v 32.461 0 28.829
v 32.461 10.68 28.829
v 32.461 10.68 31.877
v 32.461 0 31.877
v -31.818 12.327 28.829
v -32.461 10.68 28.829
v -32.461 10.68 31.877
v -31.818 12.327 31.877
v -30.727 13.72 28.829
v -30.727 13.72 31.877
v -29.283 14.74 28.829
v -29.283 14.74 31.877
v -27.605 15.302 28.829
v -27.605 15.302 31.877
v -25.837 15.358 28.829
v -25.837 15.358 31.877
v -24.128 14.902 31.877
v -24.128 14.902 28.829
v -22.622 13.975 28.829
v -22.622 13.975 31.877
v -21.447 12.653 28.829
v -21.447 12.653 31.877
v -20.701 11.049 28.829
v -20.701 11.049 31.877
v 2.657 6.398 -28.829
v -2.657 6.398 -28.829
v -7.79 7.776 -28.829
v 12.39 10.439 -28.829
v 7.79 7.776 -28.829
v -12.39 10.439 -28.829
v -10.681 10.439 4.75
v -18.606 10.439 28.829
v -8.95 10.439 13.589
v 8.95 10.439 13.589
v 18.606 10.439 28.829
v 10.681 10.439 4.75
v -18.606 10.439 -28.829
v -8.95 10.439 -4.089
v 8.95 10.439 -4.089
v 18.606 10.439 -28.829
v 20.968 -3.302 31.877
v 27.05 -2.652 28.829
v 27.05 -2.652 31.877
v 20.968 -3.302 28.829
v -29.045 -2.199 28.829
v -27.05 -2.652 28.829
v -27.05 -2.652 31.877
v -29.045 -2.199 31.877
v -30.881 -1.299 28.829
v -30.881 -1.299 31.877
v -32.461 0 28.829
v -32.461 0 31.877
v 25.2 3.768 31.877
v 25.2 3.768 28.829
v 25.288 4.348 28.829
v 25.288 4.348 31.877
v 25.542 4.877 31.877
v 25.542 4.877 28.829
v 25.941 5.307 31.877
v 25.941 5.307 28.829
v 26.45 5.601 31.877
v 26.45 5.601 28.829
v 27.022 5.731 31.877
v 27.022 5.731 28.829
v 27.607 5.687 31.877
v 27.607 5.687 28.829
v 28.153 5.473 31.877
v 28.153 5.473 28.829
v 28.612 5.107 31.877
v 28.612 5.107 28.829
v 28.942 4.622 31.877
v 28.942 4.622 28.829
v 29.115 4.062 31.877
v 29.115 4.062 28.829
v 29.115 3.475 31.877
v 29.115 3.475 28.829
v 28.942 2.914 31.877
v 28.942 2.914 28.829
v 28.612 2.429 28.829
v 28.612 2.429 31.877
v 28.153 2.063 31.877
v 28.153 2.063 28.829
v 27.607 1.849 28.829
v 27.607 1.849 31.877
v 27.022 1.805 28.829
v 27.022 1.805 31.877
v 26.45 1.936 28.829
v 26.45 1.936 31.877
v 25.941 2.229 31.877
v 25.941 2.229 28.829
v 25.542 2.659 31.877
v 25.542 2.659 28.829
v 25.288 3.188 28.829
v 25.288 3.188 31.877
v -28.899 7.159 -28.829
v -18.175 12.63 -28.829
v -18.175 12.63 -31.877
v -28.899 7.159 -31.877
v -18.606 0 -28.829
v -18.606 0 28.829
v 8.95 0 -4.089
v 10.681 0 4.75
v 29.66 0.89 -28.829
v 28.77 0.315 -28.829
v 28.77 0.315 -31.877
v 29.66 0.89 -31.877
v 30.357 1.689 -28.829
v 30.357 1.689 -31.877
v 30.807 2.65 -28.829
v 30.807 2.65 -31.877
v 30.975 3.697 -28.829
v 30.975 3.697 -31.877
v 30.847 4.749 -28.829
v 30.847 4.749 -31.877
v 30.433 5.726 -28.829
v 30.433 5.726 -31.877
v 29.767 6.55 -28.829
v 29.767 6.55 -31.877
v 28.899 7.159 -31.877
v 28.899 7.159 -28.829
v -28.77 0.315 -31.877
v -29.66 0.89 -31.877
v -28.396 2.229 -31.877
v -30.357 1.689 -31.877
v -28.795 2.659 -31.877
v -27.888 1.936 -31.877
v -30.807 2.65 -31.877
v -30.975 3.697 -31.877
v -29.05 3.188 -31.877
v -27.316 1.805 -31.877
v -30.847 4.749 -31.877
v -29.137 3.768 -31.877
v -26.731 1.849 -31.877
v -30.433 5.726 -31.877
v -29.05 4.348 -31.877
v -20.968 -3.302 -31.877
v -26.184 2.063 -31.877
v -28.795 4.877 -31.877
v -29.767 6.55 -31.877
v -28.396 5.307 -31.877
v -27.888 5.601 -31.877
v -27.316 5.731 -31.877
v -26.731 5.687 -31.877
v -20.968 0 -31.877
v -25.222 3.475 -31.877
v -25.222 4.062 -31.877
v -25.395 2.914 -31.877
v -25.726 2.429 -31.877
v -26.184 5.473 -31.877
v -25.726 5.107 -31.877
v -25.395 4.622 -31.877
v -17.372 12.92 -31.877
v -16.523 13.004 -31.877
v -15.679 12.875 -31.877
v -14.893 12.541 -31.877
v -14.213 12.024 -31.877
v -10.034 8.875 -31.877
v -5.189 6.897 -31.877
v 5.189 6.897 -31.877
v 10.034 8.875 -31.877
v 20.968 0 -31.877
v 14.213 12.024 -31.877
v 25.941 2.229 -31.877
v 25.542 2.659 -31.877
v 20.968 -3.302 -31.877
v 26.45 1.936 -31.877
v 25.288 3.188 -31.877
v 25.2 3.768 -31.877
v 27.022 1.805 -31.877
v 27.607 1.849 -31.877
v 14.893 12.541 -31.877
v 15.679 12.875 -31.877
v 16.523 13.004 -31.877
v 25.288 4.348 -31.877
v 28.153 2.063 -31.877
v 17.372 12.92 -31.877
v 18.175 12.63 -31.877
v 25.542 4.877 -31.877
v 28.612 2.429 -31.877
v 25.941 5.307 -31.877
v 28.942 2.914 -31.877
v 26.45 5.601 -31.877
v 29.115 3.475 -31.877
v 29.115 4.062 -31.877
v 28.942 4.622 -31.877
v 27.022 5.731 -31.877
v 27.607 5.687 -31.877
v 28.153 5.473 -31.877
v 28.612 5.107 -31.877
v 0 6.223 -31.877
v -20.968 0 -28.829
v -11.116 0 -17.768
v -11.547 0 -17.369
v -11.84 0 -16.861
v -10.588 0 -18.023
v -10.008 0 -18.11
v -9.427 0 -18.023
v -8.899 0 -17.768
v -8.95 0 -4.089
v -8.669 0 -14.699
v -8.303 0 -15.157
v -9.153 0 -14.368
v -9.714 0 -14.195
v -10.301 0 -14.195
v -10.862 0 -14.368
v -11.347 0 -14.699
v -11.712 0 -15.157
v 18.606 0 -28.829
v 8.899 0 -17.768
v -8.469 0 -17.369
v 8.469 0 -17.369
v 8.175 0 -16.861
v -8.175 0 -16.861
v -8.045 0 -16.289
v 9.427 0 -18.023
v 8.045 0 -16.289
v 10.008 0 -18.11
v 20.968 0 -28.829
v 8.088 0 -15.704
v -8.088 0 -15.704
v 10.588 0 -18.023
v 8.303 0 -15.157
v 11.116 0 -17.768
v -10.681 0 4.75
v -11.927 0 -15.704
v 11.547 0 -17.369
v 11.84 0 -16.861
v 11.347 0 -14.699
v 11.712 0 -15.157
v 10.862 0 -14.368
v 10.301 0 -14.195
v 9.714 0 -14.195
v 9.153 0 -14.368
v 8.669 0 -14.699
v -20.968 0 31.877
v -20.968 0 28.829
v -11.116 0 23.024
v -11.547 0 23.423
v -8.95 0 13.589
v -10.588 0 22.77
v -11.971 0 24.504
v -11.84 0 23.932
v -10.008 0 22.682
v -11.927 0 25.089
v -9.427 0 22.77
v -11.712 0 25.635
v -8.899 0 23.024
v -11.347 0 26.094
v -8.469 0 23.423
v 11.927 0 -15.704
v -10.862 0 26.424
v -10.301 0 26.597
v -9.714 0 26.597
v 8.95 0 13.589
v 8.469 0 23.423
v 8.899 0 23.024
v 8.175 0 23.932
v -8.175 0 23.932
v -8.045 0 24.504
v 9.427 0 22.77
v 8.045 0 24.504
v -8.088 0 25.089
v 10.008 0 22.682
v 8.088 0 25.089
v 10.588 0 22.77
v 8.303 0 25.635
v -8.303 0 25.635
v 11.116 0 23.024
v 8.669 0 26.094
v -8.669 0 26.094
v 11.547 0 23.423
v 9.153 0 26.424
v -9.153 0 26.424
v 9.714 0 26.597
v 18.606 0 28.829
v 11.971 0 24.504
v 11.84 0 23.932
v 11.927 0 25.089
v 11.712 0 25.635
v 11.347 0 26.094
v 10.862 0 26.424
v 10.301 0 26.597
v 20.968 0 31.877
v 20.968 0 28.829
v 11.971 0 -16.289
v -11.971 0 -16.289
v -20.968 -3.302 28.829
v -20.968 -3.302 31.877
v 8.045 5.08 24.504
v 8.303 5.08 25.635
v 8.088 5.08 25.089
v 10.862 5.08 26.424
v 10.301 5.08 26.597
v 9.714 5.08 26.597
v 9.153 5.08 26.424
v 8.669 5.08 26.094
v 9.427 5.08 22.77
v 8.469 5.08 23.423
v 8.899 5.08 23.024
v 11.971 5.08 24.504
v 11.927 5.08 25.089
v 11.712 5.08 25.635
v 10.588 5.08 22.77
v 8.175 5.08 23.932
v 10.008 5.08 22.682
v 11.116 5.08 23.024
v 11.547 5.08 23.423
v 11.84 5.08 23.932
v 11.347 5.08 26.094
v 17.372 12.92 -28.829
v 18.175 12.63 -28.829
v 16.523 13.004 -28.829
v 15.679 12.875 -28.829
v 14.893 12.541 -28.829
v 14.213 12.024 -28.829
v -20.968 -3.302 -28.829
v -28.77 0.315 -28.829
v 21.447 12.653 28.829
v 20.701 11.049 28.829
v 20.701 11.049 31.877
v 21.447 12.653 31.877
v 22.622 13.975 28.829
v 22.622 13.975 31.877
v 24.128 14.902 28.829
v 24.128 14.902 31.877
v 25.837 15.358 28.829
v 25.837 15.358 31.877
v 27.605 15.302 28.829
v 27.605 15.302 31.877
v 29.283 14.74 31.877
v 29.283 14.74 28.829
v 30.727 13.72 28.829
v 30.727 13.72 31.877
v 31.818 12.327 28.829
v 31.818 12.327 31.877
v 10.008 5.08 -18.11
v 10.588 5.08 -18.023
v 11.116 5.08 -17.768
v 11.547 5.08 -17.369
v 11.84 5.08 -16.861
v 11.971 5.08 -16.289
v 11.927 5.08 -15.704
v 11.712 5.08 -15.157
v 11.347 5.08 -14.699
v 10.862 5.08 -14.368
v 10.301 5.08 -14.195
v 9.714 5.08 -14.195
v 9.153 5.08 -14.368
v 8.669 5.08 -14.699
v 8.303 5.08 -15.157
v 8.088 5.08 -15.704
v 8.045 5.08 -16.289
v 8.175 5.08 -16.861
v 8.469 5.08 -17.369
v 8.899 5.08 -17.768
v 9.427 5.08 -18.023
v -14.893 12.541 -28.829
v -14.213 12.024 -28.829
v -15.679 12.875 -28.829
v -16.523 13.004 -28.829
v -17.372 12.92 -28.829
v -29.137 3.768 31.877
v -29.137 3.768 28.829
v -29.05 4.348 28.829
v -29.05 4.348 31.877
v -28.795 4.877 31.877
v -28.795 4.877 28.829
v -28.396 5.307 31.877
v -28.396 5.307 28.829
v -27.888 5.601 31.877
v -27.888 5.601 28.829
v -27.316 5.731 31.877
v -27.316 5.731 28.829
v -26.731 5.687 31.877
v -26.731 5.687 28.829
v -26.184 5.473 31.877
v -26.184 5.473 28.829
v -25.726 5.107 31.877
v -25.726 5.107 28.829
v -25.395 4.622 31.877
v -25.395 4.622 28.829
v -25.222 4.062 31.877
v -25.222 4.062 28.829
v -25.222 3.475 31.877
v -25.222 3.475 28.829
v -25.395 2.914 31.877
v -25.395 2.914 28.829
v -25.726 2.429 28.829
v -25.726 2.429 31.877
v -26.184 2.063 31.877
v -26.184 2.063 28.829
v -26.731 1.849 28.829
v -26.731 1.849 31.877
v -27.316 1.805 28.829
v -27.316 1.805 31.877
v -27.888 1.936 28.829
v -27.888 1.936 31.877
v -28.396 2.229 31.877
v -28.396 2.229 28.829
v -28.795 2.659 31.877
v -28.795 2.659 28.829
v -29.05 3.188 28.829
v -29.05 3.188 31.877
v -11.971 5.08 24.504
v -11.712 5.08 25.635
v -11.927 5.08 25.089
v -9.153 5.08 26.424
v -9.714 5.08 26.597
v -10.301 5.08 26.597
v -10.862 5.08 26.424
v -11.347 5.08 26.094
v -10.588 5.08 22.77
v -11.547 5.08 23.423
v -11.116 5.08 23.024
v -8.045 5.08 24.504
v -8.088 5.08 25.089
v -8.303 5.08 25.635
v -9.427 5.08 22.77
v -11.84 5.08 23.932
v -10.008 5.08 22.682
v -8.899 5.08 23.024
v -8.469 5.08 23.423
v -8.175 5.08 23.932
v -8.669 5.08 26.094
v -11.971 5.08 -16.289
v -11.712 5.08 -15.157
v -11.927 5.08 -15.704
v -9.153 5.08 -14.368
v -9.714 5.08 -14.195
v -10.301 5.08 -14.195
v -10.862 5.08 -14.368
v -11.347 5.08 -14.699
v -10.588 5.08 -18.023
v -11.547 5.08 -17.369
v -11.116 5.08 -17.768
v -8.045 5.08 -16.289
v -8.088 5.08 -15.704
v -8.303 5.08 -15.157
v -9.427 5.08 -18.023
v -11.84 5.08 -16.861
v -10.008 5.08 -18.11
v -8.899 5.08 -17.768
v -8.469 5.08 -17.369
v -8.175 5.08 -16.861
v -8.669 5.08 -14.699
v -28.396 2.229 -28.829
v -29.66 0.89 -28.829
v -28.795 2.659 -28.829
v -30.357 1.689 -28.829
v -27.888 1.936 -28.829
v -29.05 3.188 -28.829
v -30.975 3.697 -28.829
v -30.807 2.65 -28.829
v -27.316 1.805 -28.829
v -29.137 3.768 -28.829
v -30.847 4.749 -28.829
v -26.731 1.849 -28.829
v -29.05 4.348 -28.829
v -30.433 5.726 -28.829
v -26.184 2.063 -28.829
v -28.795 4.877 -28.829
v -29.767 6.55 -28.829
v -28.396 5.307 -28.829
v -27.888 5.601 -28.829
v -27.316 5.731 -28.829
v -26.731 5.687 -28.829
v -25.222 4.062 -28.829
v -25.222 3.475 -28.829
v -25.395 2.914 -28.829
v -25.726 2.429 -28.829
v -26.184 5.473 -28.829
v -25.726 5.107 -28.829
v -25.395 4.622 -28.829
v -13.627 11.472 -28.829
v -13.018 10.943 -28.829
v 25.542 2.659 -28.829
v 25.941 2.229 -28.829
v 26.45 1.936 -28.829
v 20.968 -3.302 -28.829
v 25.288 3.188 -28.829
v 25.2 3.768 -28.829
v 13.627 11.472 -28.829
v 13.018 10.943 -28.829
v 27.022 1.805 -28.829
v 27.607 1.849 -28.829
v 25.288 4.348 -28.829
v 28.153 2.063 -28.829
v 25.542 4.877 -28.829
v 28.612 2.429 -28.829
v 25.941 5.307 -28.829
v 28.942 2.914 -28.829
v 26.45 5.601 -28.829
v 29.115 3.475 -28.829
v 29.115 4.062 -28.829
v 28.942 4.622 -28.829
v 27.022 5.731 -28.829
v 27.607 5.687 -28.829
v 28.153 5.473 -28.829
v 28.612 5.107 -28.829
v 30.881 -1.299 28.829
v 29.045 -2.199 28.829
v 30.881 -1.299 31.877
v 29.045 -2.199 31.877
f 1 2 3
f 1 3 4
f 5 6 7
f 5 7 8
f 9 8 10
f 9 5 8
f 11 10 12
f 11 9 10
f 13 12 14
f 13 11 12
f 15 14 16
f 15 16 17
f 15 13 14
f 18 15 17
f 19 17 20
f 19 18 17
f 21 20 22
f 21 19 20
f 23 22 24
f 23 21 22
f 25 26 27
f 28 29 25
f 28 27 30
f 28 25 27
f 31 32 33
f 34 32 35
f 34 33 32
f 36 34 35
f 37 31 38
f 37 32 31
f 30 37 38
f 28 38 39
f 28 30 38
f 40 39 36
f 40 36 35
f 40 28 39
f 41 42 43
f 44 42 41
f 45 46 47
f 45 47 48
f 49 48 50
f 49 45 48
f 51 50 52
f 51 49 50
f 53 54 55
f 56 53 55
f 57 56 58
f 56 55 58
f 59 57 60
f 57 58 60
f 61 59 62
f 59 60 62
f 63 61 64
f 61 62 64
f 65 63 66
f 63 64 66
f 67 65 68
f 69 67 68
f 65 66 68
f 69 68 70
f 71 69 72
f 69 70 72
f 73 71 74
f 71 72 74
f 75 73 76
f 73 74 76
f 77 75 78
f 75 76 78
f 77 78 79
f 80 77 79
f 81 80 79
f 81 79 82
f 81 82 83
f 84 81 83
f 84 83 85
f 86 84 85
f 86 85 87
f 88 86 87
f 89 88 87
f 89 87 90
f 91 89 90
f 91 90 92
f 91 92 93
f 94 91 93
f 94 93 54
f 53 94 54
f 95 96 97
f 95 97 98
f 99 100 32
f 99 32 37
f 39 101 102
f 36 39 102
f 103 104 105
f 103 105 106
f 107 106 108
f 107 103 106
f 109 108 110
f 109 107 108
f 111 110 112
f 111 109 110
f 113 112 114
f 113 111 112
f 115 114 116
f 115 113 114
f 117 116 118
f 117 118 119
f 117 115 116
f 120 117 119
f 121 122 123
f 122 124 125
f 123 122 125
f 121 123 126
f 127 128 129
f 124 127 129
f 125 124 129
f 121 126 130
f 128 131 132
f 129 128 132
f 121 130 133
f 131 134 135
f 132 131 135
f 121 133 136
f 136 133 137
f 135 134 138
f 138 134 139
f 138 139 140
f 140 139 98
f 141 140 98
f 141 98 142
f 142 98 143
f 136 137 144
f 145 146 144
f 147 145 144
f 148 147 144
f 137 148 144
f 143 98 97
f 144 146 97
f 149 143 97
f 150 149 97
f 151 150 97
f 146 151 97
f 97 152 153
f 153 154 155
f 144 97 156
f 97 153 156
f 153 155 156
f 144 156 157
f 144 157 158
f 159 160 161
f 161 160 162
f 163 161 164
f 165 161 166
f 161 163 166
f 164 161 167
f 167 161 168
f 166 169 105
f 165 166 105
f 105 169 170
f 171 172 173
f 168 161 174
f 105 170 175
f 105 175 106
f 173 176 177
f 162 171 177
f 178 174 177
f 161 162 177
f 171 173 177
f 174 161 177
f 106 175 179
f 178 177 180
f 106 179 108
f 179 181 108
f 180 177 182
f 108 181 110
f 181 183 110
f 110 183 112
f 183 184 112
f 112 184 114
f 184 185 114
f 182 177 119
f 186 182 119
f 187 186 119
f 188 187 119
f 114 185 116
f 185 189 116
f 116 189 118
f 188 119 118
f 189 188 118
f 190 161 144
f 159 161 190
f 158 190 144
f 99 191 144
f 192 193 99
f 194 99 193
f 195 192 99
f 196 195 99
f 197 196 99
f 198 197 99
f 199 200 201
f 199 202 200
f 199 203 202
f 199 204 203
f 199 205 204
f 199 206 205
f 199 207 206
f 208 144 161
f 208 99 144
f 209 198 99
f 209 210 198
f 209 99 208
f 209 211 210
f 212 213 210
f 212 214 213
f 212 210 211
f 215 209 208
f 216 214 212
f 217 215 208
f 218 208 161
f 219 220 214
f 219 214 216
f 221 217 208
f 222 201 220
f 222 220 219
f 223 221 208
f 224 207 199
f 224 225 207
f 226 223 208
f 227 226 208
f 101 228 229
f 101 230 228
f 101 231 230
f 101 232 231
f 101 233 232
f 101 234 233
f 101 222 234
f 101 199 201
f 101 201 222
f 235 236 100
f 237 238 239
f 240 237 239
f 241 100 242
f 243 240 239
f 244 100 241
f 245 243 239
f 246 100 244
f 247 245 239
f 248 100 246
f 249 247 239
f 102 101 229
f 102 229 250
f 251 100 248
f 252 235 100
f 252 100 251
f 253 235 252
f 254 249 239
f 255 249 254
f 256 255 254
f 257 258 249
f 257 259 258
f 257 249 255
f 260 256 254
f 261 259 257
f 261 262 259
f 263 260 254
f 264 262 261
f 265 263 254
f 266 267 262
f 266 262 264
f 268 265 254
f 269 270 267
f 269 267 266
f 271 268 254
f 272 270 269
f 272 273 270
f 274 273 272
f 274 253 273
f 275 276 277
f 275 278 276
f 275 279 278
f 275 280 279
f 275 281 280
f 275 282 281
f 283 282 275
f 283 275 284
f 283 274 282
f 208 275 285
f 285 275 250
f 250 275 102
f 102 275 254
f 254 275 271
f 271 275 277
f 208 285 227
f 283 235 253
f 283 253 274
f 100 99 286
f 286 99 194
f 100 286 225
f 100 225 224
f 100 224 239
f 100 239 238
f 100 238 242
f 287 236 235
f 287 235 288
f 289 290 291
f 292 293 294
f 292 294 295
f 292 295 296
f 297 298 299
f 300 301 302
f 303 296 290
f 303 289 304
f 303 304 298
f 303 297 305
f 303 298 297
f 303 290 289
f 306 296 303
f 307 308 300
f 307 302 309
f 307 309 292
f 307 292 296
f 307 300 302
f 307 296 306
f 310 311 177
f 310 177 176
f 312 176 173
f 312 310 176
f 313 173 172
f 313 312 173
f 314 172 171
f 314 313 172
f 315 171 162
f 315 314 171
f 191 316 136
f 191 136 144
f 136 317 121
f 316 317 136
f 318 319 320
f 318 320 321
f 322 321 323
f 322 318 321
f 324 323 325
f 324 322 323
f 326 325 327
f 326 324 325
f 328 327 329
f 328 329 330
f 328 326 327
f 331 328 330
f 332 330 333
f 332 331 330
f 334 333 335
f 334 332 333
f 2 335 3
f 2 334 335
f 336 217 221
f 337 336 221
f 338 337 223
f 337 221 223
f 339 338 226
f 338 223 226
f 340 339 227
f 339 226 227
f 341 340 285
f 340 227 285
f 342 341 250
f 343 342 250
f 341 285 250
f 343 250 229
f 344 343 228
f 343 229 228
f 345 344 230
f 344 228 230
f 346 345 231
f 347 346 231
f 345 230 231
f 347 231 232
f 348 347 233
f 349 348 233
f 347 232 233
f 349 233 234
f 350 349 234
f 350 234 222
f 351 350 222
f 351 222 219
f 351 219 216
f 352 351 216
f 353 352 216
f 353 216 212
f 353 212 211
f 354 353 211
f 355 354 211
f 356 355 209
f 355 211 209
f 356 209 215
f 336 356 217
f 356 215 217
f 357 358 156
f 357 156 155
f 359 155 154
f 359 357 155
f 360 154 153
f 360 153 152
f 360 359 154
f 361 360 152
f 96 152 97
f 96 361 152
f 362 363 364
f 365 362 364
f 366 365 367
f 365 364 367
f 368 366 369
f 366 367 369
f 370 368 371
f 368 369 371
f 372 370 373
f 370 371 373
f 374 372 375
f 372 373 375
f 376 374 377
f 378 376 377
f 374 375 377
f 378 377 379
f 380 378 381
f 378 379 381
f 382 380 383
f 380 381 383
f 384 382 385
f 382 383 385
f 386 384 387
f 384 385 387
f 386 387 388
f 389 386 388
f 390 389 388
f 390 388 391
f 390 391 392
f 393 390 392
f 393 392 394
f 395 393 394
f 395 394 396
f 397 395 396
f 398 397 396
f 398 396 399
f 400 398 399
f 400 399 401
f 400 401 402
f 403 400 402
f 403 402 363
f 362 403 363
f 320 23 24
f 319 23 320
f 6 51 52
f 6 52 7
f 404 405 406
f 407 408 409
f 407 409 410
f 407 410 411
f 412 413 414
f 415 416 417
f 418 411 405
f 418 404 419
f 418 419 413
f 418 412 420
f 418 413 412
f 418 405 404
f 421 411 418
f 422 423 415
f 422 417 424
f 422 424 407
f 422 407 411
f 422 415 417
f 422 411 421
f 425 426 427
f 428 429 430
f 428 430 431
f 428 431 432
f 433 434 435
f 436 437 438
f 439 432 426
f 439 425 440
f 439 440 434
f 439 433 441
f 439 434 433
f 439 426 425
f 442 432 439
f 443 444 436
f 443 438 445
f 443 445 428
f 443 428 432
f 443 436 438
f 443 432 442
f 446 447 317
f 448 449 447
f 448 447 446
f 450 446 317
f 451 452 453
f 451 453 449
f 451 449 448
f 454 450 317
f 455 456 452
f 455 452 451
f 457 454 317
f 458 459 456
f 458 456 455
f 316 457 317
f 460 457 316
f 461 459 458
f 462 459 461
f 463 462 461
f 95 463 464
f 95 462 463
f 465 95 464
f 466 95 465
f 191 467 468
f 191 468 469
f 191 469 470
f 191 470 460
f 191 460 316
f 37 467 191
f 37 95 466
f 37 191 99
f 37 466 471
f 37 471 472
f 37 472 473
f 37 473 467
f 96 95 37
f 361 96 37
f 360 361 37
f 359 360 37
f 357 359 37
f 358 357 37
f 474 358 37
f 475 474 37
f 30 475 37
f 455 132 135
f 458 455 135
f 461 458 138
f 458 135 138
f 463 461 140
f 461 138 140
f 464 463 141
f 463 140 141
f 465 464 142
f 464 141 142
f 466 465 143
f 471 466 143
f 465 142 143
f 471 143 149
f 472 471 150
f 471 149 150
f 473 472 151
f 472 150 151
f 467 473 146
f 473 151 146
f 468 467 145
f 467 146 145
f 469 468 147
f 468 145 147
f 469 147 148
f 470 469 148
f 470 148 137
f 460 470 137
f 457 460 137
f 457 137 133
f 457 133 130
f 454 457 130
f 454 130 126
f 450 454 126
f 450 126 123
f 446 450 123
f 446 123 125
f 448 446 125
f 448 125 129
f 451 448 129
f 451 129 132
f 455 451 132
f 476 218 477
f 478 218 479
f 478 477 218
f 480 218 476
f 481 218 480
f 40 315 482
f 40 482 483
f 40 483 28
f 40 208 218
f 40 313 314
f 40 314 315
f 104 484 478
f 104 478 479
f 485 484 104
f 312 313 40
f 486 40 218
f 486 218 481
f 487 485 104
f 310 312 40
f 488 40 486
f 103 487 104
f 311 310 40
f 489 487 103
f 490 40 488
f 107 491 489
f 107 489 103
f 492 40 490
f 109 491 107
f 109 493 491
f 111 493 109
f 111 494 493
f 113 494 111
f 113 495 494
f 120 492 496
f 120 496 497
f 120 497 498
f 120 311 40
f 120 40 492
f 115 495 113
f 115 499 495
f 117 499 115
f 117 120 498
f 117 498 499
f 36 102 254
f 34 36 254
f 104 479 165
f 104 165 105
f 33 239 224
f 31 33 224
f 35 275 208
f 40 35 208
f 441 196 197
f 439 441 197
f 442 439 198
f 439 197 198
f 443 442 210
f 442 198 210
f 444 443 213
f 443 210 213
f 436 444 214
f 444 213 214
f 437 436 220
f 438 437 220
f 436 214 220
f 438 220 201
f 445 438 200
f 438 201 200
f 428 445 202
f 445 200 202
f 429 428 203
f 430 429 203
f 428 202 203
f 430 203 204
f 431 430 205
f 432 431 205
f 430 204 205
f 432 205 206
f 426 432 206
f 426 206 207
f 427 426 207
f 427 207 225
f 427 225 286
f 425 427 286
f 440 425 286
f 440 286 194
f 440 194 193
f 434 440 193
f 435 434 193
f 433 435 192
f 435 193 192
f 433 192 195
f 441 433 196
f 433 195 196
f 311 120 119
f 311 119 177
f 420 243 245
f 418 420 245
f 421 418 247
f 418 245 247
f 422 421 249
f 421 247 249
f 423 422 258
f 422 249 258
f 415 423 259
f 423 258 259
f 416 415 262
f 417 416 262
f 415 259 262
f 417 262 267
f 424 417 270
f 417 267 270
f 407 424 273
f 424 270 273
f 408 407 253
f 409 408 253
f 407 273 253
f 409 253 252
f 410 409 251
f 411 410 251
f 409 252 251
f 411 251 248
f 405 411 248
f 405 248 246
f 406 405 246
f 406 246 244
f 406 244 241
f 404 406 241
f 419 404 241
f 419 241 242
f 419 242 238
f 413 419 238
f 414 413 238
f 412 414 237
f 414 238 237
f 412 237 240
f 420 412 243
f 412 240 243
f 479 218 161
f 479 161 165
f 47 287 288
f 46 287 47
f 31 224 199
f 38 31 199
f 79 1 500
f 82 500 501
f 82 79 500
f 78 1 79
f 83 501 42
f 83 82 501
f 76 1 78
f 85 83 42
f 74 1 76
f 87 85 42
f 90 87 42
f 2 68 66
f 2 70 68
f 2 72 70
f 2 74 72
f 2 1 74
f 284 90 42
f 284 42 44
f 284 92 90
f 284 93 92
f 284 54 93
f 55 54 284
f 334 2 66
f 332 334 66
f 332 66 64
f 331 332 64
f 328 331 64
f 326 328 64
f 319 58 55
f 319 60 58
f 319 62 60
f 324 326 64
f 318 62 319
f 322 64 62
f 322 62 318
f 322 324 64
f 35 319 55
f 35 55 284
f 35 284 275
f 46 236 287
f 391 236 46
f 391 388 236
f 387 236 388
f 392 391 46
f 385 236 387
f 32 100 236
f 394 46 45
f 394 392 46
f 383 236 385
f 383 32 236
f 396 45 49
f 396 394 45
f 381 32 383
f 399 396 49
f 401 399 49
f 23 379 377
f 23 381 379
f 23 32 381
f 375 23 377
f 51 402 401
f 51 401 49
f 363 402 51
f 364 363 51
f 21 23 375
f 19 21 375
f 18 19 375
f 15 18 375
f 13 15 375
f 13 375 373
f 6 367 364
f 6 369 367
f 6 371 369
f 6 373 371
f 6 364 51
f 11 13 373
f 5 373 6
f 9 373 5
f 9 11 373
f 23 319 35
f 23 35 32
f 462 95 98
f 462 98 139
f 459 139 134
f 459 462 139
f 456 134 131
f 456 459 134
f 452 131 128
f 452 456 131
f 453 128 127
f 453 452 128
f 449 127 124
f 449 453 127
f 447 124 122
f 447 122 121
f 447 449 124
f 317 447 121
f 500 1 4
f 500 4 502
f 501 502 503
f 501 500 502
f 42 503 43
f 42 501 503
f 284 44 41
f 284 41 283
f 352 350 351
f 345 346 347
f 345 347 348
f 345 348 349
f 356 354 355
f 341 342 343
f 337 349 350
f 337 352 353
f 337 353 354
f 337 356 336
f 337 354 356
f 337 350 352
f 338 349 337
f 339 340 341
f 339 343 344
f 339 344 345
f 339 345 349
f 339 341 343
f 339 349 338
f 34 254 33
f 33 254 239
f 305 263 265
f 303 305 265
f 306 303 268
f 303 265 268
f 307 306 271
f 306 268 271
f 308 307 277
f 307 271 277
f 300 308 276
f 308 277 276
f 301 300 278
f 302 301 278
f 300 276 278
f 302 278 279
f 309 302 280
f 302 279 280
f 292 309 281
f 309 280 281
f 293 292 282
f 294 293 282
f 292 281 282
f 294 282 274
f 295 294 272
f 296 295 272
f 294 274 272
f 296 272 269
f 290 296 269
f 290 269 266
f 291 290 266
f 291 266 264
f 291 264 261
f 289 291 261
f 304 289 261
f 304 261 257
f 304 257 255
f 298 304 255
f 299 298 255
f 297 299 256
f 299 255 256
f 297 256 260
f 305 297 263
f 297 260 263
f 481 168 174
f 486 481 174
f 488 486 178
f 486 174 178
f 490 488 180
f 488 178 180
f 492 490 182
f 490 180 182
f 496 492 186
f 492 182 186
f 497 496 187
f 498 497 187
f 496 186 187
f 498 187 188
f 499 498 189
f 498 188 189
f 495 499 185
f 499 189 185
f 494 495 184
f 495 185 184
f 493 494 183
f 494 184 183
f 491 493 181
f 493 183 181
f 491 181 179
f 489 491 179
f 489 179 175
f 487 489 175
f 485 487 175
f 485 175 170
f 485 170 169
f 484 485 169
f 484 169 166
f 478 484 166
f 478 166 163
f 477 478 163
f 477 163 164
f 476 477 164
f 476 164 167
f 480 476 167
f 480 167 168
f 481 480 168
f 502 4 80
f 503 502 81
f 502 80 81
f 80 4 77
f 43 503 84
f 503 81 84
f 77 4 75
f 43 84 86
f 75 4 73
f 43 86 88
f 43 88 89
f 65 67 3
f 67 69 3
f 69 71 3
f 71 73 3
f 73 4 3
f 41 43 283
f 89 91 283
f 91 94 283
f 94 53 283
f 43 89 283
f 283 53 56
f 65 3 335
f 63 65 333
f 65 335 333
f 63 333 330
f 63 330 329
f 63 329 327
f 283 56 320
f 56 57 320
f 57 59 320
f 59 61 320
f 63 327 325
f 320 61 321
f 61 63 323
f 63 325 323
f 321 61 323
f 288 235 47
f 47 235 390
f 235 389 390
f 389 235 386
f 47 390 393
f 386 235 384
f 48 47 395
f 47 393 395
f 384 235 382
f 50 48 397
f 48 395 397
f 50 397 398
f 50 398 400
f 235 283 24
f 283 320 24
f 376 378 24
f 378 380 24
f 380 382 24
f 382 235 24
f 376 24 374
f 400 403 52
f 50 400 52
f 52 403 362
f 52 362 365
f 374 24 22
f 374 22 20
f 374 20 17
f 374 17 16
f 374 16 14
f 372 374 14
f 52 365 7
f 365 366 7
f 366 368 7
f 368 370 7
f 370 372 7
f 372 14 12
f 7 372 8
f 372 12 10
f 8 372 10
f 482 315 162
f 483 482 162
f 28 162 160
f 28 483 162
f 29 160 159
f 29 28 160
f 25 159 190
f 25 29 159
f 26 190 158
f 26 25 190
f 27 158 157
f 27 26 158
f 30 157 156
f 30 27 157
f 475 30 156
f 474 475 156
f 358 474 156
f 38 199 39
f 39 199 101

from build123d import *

# Parameters (mm, degrees)
SKETCH1_W           = 37.211
SKETCH1_H           = 57.658
BOSS_EXTRUDE1_DEPTH = 10.4394
BOSS_EXTRUDE2_DEPTH = 3.048
BOSS_EXTRUDE3_DEPTH = 3.048
SKETCH5_R           = 1.9685
CUT_EXTRUDE1_DEPTH  = 74.180460976
SKETCH6_R           = 1.9685
CUT_EXTRUDE2_DEPTH  = 5.08


with BuildPart() as part:
    # Sketch1 → Boss-Extrude1 (new body)
    with BuildSketch(Plane(origin=(0, 0, 0), x_dir=(1, 0, 0), z_dir=(0, 1, 0))):
        Rectangle(SKETCH1_W, SKETCH1_H)
        Polygon((-8.949851054, 4.0894), (8.949851054, 4.0894), (10.6807, -4.7498), (8.949851054, -13.589), (-8.949851054, -13.589), (-10.6807, -4.7498), align=None, mode=Mode.SUBTRACT)
    extrude(amount=BOSS_EXTRUDE1_DEPTH)

    # Sketch2 → Boss-Extrude2 (add)
    with BuildSketch(Plane.XY.offset(28.829)):
        with BuildLine():
            Line((-20.701, 11.049), (20.701, 11.049))
            ThreePointArc((20.701, 11.049), (26.723405801, 15.394332642), (32.4612, 10.679568052))
            Line((32.4612, 10.679568052), (32.4612, 0))
            ThreePointArc((32.4612, 0), (29.989172762, -1.802849379), (27.049629295, -2.651535867))
            Line((27.049629295, -2.651535867), (20.9677, -3.302))
            Line((20.9677, -3.302), (20.9677, 0))
            Line((20.9677, 0), (-20.9677, 0))
            Line((-20.9677, 0), (-20.9677, -3.302))
            Line((-20.9677, -3.302), (-27.049629295, -2.651535867))
            ThreePointArc((-27.049629295, -2.651535867), (-29.989172762, -1.802849379), (-32.4612, 0))
            Line((-32.4612, 0), (-32.4612, 10.679568052))
            ThreePointArc((-32.4612, 10.679568052), (-26.723405801, 15.394332642), (-20.701, 11.049))
        make_face()
    extrude(amount=BOSS_EXTRUDE2_DEPTH)

    # Sketch3 → Boss-Extrude3 (add)
    with BuildSketch(Plane(origin=(0, 0, -28.829), x_dir=(-1, 0, 0), z_dir=(0, 0, -1))):
        with BuildLine():
            Line((18.175030658, 12.62989205), (28.898610874, 7.159054501))
            ThreePointArc((28.898610874, 7.159054501), (30.974624731, 3.696565568), (28.769674487, 0.314723233))
            Line((28.769674487, 0.314723233), (20.9677, -3.302))
            Line((20.9677, -3.302), (20.9677, 0))
            Line((20.9677, 0), (0, 0))
            Line((0, 0), (-20.9677, 0))
            Line((-20.9677, 0), (-20.9677, -3.302))
            Line((-20.9677, -3.302), (-28.769674487, 0.314723233))
            ThreePointArc((-28.769674487, 0.314723233), (-30.974624731, 3.696565568), (-28.898610874, 7.159054501))
            Line((-28.898610874, 7.159054501), (-18.175030658, 12.62989205))
            ThreePointArc((-18.175030658, 12.62989205), (-16.096634608, 12.965404658), (-14.213319827, 12.024434793))
            ThreePointArc((-14.213319827, 12.024434793), (0, 6.223), (14.213319827, 12.024434793))
            ThreePointArc((14.213319827, 12.024434793), (16.096634608, 12.965404658), (18.175030658, 12.62989205))
        make_face()
    extrude(amount=BOSS_EXTRUDE3_DEPTH)

    # Sketch5 → Cut-Extrude1 (cut, through all)
    with BuildSketch(Plane(origin=(0, 0, -31.877), x_dir=(-1, 0, 0), z_dir=(0, 0, -1))):
        with Locations((-27.16873413, 3.768262533)):
            Circle(SKETCH5_R)
        with Locations((27.16873413, 3.768262533)):
            Circle(SKETCH5_R)
    extrude(amount=-CUT_EXTRUDE1_DEPTH, mode=Mode.SUBTRACT)

    # Sketch6 → Cut-Extrude2 (cut)
    with BuildSketch(Plane.XZ):
        with Locations(Location((-10.0076, 24.6507, 0), (0, 0, 270))):
            Circle(SKETCH6_R)
        with Locations(Location((10.0076, 24.6507, 0), (0, 0, 270))):
            Circle(SKETCH6_R)
        with Locations(Location((-10.0076, -16.1417, 0), (0, 0, 270))):
            Circle(SKETCH6_R)
        with Locations(Location((10.0076, -16.1417, 0), (0, 0, 270))):
            Circle(SKETCH6_R)
    extrude(amount=-CUT_EXTRUDE2_DEPTH, mode=Mode.SUBTRACT)


solid = part.part
